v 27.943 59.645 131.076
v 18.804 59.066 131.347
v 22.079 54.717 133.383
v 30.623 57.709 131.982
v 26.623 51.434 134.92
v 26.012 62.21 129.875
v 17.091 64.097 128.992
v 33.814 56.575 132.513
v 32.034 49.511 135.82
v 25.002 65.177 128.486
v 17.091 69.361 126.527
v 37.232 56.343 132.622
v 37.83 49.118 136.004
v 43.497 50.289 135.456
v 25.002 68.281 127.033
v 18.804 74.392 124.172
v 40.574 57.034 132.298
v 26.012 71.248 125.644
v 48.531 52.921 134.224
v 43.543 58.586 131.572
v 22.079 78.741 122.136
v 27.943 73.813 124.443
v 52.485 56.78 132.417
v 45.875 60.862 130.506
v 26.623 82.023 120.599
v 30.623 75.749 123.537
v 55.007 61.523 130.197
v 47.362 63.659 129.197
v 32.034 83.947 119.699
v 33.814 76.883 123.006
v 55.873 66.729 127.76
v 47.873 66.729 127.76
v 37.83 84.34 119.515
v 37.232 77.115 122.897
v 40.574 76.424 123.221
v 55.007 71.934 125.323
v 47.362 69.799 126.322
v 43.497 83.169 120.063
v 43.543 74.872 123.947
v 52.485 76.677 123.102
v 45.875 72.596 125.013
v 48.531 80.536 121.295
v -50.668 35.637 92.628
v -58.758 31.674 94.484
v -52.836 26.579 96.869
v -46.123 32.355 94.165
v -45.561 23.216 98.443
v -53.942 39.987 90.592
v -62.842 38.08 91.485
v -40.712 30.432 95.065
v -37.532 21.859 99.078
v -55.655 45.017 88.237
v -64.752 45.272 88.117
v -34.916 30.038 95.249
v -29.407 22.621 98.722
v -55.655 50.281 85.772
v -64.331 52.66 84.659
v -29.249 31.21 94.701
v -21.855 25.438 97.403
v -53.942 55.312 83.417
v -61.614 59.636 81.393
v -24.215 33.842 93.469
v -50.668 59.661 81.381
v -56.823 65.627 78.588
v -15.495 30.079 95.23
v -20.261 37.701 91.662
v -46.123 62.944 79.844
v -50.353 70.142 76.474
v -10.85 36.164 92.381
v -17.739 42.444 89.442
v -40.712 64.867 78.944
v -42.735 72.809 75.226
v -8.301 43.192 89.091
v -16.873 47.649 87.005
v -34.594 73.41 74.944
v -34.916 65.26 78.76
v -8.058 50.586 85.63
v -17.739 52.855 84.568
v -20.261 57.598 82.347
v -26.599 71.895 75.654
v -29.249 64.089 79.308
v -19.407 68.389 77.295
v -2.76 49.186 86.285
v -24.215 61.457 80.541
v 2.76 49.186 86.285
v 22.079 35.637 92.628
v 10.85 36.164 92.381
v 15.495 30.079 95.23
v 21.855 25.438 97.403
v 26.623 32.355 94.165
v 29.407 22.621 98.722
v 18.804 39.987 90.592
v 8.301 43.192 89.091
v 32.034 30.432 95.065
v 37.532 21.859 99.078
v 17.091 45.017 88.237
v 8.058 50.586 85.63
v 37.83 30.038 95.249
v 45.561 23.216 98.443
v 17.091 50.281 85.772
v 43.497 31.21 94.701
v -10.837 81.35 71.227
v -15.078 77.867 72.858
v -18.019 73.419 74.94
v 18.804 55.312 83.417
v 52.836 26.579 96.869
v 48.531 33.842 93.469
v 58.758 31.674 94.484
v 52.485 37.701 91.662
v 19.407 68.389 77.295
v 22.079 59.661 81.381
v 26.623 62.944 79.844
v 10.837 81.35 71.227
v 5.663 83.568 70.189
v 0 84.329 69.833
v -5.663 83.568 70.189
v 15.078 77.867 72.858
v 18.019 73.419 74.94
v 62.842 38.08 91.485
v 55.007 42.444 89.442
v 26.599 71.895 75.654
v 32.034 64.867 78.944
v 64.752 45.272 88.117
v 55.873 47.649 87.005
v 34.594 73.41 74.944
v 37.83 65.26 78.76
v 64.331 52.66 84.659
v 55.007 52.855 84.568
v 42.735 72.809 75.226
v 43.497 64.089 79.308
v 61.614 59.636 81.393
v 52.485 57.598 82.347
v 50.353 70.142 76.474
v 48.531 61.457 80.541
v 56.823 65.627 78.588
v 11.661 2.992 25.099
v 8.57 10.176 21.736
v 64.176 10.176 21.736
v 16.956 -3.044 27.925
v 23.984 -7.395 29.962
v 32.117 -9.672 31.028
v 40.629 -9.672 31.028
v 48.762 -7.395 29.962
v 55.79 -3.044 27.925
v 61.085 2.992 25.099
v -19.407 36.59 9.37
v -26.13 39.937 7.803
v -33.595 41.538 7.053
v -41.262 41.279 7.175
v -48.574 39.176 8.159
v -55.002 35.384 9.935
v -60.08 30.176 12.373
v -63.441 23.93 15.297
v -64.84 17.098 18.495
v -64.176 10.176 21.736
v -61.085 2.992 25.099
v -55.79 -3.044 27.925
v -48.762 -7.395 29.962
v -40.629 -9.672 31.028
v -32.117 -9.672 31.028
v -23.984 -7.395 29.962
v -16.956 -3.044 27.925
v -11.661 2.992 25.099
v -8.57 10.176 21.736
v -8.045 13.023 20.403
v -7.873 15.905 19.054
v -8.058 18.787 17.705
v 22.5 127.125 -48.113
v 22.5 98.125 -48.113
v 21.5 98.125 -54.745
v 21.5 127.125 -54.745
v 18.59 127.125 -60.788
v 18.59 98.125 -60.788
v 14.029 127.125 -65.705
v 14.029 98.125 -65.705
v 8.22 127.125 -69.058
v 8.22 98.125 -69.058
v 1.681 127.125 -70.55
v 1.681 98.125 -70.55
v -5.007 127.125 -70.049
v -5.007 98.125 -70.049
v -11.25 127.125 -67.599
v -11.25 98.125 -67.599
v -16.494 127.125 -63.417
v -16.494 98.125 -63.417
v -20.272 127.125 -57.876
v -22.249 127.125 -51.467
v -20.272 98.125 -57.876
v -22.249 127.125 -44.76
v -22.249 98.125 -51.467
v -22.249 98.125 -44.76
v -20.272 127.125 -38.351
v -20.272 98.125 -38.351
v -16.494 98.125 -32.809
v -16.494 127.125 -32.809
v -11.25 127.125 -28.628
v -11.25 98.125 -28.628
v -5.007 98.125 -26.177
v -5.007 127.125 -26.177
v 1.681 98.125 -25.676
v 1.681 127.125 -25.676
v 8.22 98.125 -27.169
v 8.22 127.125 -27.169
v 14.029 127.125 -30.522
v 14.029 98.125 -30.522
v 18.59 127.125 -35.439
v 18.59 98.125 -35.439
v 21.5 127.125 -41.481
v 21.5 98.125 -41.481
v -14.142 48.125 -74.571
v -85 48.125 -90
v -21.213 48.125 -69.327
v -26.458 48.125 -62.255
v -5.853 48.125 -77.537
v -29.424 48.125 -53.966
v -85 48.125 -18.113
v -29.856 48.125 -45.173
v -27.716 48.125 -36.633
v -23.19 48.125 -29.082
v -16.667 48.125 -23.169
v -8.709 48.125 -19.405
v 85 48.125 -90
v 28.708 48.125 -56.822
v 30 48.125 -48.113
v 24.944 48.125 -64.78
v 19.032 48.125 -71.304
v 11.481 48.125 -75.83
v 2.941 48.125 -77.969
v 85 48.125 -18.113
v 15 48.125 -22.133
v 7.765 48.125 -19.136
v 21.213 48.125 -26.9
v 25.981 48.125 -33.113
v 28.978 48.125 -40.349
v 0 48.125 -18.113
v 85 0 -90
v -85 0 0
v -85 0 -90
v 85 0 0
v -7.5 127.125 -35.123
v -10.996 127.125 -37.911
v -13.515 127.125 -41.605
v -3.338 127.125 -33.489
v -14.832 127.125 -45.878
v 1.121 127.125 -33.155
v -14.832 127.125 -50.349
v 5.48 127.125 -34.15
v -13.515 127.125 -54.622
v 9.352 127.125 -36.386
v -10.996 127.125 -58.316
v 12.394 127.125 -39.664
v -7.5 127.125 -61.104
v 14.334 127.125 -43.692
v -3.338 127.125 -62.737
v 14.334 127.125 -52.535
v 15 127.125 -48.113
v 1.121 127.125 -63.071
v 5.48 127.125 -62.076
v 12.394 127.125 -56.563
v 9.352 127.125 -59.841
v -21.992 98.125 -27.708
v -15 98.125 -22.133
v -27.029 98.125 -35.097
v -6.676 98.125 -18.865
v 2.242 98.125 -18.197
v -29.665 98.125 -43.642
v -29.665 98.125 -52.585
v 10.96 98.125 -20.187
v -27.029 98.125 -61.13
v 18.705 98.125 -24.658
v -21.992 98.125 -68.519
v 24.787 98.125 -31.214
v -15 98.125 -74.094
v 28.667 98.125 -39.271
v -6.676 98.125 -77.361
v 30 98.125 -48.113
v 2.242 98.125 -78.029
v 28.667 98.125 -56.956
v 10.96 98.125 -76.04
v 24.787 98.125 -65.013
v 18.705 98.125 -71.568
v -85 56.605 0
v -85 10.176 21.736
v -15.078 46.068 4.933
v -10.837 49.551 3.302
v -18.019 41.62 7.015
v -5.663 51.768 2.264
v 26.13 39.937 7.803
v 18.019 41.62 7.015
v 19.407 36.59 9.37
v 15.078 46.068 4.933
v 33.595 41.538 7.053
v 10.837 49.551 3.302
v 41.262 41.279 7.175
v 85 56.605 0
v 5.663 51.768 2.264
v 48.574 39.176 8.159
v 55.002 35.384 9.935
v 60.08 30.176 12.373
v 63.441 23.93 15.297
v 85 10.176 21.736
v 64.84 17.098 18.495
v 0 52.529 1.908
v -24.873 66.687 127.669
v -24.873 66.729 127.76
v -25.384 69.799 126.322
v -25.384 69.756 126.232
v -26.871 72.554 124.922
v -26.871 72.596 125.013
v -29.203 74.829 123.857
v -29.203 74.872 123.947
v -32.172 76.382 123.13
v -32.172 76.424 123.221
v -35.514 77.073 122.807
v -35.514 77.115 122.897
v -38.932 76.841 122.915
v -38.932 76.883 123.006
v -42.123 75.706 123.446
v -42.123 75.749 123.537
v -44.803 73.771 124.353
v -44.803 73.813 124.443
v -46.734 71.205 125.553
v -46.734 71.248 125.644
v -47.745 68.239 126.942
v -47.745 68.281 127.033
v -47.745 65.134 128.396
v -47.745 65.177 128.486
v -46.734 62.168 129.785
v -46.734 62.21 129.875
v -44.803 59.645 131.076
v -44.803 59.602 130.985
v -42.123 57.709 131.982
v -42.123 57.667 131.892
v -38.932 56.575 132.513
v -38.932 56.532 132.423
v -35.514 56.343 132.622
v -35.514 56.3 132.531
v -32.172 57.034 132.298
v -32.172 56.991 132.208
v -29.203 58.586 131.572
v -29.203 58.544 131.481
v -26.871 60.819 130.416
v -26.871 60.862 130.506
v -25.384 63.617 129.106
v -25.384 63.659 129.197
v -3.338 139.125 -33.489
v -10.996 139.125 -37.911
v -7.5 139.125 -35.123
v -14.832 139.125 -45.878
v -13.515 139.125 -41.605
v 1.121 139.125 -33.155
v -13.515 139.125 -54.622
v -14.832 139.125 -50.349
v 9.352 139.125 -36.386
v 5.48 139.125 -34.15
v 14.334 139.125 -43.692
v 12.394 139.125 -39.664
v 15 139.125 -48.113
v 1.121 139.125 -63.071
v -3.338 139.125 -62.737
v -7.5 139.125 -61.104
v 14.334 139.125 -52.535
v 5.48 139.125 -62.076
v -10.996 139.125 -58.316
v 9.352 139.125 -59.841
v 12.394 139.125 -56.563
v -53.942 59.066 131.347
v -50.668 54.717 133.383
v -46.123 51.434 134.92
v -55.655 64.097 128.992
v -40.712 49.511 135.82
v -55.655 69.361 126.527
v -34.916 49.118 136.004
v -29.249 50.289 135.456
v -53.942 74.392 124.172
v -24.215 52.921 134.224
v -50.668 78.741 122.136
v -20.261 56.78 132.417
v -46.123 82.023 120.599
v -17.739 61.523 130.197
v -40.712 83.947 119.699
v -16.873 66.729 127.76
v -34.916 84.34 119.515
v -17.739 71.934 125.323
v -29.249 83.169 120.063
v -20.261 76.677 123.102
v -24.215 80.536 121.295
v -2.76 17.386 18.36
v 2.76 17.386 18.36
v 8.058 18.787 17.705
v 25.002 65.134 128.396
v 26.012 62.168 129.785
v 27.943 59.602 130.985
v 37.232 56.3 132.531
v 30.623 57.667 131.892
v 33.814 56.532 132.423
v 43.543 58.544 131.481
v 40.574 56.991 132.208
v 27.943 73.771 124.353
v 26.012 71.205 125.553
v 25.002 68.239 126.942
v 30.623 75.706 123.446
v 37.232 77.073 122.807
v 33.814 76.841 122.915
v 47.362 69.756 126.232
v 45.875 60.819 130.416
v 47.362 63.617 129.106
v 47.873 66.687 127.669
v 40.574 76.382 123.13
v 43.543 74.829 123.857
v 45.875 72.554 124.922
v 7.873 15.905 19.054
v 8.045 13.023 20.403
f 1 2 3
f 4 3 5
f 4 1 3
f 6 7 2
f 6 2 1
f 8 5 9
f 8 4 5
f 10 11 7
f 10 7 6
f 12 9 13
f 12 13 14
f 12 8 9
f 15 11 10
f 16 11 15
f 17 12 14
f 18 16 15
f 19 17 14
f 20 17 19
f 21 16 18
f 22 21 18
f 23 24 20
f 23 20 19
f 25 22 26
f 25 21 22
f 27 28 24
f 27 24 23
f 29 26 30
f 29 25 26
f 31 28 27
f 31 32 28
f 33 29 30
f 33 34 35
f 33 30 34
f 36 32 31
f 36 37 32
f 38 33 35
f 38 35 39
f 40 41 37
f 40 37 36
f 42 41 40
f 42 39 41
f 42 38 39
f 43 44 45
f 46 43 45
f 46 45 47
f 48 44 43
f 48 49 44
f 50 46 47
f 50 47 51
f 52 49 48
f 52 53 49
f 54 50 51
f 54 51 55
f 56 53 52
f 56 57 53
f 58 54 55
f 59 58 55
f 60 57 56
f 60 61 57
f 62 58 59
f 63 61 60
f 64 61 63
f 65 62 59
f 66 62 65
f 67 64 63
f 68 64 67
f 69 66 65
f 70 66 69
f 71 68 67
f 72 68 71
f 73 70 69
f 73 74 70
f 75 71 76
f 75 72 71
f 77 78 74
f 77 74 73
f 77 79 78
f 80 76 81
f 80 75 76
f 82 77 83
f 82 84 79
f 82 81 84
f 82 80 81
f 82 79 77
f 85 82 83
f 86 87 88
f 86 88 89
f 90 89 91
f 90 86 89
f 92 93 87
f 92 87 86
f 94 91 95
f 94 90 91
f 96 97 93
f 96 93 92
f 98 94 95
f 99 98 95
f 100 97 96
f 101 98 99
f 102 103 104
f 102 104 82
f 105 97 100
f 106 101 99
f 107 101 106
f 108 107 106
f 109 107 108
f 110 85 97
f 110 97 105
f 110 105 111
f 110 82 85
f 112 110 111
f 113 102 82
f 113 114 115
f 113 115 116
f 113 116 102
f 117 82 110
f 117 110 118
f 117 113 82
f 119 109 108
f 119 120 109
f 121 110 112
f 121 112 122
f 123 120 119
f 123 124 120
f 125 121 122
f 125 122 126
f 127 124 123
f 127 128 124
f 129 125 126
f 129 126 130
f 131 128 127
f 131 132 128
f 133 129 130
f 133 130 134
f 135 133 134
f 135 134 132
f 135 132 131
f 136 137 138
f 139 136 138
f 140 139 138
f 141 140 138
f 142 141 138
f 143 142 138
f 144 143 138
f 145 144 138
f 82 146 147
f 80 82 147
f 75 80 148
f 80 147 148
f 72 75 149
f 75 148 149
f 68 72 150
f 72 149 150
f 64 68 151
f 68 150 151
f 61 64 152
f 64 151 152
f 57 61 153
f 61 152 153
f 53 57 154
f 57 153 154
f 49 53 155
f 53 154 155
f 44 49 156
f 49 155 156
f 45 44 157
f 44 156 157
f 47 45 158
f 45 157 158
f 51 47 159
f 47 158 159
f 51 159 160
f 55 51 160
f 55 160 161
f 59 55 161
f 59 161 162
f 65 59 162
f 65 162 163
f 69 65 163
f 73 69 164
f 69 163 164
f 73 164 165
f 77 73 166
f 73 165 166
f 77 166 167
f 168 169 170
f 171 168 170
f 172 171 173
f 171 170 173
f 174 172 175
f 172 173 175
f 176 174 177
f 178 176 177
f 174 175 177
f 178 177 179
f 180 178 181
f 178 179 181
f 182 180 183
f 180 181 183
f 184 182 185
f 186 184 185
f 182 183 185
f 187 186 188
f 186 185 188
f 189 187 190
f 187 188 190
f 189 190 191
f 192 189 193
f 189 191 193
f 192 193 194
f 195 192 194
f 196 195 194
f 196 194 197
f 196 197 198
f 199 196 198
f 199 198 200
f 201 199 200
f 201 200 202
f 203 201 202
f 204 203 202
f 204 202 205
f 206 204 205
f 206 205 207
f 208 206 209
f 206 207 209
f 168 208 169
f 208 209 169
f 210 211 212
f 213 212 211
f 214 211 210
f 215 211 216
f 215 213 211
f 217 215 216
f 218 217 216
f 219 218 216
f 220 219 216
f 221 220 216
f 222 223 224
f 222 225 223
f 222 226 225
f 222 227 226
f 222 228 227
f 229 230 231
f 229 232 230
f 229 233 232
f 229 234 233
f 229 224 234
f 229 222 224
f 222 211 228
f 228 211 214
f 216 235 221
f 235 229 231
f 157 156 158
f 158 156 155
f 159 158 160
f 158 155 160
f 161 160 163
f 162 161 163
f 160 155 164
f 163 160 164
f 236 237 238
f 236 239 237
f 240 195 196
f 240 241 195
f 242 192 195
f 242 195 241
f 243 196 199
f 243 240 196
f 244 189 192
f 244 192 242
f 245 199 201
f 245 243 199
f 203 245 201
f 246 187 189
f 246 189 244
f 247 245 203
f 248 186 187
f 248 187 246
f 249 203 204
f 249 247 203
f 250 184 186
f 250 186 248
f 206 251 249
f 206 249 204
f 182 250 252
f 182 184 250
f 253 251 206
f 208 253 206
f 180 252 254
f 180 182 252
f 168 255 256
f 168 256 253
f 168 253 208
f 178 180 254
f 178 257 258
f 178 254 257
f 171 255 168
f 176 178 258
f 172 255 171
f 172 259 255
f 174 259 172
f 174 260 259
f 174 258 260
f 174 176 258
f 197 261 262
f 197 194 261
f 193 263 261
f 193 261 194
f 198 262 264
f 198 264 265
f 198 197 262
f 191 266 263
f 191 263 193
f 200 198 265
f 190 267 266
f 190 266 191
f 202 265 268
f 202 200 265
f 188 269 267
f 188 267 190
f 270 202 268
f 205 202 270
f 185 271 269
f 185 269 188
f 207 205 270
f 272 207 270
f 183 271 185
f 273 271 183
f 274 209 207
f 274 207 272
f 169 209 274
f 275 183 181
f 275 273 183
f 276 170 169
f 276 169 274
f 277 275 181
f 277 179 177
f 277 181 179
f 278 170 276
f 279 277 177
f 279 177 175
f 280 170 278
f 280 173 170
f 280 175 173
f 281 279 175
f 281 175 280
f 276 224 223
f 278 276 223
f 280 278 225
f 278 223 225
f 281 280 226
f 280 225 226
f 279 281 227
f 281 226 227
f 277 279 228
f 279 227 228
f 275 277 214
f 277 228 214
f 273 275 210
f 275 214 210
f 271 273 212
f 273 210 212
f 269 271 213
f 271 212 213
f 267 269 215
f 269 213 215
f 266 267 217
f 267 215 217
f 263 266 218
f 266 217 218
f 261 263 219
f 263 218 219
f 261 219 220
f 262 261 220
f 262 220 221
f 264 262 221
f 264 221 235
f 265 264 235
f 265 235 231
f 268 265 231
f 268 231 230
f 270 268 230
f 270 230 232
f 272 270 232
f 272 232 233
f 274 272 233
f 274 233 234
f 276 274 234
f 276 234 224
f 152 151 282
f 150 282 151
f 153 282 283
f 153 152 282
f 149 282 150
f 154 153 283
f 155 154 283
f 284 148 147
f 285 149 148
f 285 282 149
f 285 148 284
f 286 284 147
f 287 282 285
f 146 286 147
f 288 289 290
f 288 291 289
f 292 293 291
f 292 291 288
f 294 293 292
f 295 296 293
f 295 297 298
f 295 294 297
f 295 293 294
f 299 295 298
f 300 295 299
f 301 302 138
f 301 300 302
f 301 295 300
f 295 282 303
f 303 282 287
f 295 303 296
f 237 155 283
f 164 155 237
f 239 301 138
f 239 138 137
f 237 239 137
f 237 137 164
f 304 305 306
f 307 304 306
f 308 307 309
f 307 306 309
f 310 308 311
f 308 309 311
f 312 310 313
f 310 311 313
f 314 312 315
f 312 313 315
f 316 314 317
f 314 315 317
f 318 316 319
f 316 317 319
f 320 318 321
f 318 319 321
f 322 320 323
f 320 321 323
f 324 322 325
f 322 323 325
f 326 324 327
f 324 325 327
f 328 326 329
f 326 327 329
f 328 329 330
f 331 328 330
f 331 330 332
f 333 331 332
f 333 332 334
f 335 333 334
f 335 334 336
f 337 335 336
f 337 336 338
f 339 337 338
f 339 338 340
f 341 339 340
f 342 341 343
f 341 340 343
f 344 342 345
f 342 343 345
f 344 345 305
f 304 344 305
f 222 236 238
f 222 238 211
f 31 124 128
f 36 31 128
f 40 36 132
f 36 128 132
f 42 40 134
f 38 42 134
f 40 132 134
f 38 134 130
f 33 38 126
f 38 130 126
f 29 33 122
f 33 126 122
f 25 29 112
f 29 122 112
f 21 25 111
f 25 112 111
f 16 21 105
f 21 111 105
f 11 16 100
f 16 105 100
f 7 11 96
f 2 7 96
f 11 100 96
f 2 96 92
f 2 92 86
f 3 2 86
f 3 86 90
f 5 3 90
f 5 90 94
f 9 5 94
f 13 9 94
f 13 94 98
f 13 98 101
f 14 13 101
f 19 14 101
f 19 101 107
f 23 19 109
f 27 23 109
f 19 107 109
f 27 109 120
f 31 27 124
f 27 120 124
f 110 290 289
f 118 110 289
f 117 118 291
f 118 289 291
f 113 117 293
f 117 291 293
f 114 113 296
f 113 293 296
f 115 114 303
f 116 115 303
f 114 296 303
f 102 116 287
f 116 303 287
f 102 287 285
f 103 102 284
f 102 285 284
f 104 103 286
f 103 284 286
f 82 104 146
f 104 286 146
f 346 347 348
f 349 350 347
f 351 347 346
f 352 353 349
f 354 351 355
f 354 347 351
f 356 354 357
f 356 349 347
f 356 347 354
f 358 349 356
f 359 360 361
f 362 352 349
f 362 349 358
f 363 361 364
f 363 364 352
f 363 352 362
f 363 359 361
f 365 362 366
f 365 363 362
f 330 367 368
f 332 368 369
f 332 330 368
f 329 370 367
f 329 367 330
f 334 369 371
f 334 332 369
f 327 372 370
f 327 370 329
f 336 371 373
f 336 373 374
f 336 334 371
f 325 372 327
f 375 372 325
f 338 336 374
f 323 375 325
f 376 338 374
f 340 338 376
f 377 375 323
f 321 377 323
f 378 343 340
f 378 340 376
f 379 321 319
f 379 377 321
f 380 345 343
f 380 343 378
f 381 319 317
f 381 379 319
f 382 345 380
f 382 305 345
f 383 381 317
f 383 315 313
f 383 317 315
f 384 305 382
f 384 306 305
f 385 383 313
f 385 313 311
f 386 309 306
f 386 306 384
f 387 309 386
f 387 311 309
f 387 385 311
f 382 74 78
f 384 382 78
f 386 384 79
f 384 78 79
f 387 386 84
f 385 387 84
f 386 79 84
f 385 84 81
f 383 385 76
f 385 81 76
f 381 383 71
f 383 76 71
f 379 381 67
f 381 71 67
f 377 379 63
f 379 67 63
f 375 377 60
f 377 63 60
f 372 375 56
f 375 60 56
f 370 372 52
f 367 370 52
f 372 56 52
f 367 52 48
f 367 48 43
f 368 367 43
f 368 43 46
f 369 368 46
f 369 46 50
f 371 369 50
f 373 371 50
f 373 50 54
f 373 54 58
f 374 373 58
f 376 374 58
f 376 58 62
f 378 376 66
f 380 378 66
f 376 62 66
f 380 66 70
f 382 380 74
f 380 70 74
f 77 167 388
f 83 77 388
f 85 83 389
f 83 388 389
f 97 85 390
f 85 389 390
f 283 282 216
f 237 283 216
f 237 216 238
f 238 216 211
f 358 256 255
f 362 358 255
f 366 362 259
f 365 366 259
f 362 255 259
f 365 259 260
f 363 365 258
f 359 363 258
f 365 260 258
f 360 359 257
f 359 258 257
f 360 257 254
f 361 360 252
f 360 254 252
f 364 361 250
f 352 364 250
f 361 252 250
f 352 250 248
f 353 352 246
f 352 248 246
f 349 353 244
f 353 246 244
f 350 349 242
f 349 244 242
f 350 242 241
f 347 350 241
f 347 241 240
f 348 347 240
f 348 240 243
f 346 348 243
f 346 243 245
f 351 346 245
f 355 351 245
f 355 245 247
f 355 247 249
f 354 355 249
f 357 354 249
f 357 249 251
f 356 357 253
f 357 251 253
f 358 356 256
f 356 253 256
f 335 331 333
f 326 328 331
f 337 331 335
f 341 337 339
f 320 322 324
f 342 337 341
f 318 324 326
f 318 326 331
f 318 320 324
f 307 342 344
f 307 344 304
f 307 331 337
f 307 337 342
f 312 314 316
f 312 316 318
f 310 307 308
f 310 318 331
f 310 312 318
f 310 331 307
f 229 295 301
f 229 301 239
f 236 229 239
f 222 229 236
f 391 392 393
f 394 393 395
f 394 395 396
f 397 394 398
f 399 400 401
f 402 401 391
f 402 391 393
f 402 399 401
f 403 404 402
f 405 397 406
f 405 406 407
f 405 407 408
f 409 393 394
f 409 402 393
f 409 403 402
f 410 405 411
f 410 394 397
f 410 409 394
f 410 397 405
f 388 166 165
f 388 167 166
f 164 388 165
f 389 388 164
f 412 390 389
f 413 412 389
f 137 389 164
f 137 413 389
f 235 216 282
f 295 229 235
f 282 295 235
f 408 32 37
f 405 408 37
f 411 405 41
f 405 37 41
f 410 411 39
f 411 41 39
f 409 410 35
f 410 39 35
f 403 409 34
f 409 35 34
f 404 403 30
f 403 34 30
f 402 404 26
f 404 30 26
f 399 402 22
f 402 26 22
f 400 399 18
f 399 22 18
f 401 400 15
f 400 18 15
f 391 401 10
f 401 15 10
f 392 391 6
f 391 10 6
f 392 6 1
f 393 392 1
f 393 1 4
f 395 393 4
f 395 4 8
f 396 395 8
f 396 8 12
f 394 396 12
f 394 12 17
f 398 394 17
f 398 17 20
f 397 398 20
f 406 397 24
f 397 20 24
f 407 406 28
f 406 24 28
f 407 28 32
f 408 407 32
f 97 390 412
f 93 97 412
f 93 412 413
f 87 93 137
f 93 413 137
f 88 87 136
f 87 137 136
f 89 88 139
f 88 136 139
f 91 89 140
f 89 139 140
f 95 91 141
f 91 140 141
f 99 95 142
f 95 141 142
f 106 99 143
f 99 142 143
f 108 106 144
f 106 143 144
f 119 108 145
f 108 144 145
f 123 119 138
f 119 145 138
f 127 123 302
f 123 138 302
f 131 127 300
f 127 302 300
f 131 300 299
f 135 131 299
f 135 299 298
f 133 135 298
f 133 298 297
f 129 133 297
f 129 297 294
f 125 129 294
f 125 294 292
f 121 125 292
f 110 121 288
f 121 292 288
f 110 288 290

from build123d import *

# Parameters (mm, degrees)
BOSS_EXTRUDE1_DEPTH = 85
SKETCH4_R           = 30
BOSS_EXTRUDE2_DEPTH = 50
SKETCH5_R           = 22.5
BOSS_EXTRUDE3_DEPTH = 29
SKETCH6_R           = 15
BOSS_EXTRUDE4_DEPTH = 12
BOSS_EXTRUDE5_DEPTH = 75
SKETCH8_R           = 19.5
BOSS_EXTRUDE6_DEPTH = 45
SKETCH9_R           = 11.5
CUT_EXTRUDE1_DEPTH  = 0.1


with BuildPart() as part:
    # Sketch3 → Boss-Extrude1 (new, symmetric)
    with BuildSketch(Plane(origin=(0, 0, 0), x_dir=(0, 0, -1), z_dir=(1, 0, 0))):
        Polygon((0, 0), (90, 0), (90, 48.125), (18.113318582, 48.125), (0, 56.604840209), (-21.735982298, 10.17580825), align=None)
    extrude(amount=BOSS_EXTRUDE1_DEPTH, both=True)

    # Sketch4 → Boss-Extrude2 (add)
    with BuildSketch(Plane(origin=(0, 48.125, 0), x_dir=(1, 0, 0), z_dir=(0, 1, 0))):
        with Locations((0, 48.113318582)):
            Circle(SKETCH4_R)
    extrude(amount=BOSS_EXTRUDE2_DEPTH)

    # Sketch5 → Boss-Extrude3 (add)
    with BuildSketch(Plane(origin=(0, 98.125, 0), x_dir=(1, 0, 0), z_dir=(0, 1, 0))):
        with Locations((0, 48.113318582)):
            Circle(SKETCH5_R)
    extrude(amount=BOSS_EXTRUDE3_DEPTH)

    # Sketch6 → Boss-Extrude4 (add)
    with BuildSketch(Plane(origin=(0, 127.125, 0), x_dir=(1, 0, 0), z_dir=(0, 1, 0))):
        with Locations((0, 48.113318582)):
            Circle(SKETCH6_R)
    extrude(amount=BOSS_EXTRUDE4_DEPTH)

    # Sketch7 → Boss-Extrude5 (add)
    with BuildSketch(Plane(origin=(0, 10.17580825, 21.735982298), x_dir=(1, 0, 0), z_dir=(0, 0.4239920104282593, 0.9056659290781578))):
        with BuildLine():
            ThreePointArc((-8.058161684, 9.507934936), (0, 7.765075198), (8.058161684, 9.507934936))
            ThreePointArc((8.058161684, 9.507934936), (61.054790967, -7.984924802), (19.407215407, 29.165072602))
            ThreePointArc((19.407215407, 29.165072602), (0, 46.765075198), (-19.407215407, 29.165072602))
            ThreePointArc((-19.407215407, 29.165072602), (-61.054790967, -7.984924802), (-8.058161684, 9.507934936))
        make_face()
    extrude(amount=BOSS_EXTRUDE5_DEPTH)

    # Sketch8 → Boss-Extrude6 (add)
    with BuildSketch(Plane(origin=(0, 41.975209032, 89.660926979), x_dir=(1, 0, 0), z_dir=(0, 0.42399201042825935, 0.905665929078158))):
        with Locations((-36.373066959, 6.265075198)):
            Circle(SKETCH8_R)
        with Locations((36.373066959, 6.265075198)):
            Circle(SKETCH8_R)
    extrude(amount=BOSS_EXTRUDE6_DEPTH)

    # Sketch9 → Cut-Extrude1 (cut)
    with BuildSketch(Plane(origin=(0, 61.054849502, 130.415893787), x_dir=(1, 0, 0), z_dir=(0, 0.42399201042825946, 0.9056659290781579))):
        with Locations((-36.373066959, 6.265075198)):
            Circle(SKETCH9_R)
        with Locations((36.373066959, 6.265075198)):
            Circle(SKETCH9_R)
    extrude(amount=-CUT_EXTRUDE1_DEPTH, mode=Mode.SUBTRACT)


solid = part.part
